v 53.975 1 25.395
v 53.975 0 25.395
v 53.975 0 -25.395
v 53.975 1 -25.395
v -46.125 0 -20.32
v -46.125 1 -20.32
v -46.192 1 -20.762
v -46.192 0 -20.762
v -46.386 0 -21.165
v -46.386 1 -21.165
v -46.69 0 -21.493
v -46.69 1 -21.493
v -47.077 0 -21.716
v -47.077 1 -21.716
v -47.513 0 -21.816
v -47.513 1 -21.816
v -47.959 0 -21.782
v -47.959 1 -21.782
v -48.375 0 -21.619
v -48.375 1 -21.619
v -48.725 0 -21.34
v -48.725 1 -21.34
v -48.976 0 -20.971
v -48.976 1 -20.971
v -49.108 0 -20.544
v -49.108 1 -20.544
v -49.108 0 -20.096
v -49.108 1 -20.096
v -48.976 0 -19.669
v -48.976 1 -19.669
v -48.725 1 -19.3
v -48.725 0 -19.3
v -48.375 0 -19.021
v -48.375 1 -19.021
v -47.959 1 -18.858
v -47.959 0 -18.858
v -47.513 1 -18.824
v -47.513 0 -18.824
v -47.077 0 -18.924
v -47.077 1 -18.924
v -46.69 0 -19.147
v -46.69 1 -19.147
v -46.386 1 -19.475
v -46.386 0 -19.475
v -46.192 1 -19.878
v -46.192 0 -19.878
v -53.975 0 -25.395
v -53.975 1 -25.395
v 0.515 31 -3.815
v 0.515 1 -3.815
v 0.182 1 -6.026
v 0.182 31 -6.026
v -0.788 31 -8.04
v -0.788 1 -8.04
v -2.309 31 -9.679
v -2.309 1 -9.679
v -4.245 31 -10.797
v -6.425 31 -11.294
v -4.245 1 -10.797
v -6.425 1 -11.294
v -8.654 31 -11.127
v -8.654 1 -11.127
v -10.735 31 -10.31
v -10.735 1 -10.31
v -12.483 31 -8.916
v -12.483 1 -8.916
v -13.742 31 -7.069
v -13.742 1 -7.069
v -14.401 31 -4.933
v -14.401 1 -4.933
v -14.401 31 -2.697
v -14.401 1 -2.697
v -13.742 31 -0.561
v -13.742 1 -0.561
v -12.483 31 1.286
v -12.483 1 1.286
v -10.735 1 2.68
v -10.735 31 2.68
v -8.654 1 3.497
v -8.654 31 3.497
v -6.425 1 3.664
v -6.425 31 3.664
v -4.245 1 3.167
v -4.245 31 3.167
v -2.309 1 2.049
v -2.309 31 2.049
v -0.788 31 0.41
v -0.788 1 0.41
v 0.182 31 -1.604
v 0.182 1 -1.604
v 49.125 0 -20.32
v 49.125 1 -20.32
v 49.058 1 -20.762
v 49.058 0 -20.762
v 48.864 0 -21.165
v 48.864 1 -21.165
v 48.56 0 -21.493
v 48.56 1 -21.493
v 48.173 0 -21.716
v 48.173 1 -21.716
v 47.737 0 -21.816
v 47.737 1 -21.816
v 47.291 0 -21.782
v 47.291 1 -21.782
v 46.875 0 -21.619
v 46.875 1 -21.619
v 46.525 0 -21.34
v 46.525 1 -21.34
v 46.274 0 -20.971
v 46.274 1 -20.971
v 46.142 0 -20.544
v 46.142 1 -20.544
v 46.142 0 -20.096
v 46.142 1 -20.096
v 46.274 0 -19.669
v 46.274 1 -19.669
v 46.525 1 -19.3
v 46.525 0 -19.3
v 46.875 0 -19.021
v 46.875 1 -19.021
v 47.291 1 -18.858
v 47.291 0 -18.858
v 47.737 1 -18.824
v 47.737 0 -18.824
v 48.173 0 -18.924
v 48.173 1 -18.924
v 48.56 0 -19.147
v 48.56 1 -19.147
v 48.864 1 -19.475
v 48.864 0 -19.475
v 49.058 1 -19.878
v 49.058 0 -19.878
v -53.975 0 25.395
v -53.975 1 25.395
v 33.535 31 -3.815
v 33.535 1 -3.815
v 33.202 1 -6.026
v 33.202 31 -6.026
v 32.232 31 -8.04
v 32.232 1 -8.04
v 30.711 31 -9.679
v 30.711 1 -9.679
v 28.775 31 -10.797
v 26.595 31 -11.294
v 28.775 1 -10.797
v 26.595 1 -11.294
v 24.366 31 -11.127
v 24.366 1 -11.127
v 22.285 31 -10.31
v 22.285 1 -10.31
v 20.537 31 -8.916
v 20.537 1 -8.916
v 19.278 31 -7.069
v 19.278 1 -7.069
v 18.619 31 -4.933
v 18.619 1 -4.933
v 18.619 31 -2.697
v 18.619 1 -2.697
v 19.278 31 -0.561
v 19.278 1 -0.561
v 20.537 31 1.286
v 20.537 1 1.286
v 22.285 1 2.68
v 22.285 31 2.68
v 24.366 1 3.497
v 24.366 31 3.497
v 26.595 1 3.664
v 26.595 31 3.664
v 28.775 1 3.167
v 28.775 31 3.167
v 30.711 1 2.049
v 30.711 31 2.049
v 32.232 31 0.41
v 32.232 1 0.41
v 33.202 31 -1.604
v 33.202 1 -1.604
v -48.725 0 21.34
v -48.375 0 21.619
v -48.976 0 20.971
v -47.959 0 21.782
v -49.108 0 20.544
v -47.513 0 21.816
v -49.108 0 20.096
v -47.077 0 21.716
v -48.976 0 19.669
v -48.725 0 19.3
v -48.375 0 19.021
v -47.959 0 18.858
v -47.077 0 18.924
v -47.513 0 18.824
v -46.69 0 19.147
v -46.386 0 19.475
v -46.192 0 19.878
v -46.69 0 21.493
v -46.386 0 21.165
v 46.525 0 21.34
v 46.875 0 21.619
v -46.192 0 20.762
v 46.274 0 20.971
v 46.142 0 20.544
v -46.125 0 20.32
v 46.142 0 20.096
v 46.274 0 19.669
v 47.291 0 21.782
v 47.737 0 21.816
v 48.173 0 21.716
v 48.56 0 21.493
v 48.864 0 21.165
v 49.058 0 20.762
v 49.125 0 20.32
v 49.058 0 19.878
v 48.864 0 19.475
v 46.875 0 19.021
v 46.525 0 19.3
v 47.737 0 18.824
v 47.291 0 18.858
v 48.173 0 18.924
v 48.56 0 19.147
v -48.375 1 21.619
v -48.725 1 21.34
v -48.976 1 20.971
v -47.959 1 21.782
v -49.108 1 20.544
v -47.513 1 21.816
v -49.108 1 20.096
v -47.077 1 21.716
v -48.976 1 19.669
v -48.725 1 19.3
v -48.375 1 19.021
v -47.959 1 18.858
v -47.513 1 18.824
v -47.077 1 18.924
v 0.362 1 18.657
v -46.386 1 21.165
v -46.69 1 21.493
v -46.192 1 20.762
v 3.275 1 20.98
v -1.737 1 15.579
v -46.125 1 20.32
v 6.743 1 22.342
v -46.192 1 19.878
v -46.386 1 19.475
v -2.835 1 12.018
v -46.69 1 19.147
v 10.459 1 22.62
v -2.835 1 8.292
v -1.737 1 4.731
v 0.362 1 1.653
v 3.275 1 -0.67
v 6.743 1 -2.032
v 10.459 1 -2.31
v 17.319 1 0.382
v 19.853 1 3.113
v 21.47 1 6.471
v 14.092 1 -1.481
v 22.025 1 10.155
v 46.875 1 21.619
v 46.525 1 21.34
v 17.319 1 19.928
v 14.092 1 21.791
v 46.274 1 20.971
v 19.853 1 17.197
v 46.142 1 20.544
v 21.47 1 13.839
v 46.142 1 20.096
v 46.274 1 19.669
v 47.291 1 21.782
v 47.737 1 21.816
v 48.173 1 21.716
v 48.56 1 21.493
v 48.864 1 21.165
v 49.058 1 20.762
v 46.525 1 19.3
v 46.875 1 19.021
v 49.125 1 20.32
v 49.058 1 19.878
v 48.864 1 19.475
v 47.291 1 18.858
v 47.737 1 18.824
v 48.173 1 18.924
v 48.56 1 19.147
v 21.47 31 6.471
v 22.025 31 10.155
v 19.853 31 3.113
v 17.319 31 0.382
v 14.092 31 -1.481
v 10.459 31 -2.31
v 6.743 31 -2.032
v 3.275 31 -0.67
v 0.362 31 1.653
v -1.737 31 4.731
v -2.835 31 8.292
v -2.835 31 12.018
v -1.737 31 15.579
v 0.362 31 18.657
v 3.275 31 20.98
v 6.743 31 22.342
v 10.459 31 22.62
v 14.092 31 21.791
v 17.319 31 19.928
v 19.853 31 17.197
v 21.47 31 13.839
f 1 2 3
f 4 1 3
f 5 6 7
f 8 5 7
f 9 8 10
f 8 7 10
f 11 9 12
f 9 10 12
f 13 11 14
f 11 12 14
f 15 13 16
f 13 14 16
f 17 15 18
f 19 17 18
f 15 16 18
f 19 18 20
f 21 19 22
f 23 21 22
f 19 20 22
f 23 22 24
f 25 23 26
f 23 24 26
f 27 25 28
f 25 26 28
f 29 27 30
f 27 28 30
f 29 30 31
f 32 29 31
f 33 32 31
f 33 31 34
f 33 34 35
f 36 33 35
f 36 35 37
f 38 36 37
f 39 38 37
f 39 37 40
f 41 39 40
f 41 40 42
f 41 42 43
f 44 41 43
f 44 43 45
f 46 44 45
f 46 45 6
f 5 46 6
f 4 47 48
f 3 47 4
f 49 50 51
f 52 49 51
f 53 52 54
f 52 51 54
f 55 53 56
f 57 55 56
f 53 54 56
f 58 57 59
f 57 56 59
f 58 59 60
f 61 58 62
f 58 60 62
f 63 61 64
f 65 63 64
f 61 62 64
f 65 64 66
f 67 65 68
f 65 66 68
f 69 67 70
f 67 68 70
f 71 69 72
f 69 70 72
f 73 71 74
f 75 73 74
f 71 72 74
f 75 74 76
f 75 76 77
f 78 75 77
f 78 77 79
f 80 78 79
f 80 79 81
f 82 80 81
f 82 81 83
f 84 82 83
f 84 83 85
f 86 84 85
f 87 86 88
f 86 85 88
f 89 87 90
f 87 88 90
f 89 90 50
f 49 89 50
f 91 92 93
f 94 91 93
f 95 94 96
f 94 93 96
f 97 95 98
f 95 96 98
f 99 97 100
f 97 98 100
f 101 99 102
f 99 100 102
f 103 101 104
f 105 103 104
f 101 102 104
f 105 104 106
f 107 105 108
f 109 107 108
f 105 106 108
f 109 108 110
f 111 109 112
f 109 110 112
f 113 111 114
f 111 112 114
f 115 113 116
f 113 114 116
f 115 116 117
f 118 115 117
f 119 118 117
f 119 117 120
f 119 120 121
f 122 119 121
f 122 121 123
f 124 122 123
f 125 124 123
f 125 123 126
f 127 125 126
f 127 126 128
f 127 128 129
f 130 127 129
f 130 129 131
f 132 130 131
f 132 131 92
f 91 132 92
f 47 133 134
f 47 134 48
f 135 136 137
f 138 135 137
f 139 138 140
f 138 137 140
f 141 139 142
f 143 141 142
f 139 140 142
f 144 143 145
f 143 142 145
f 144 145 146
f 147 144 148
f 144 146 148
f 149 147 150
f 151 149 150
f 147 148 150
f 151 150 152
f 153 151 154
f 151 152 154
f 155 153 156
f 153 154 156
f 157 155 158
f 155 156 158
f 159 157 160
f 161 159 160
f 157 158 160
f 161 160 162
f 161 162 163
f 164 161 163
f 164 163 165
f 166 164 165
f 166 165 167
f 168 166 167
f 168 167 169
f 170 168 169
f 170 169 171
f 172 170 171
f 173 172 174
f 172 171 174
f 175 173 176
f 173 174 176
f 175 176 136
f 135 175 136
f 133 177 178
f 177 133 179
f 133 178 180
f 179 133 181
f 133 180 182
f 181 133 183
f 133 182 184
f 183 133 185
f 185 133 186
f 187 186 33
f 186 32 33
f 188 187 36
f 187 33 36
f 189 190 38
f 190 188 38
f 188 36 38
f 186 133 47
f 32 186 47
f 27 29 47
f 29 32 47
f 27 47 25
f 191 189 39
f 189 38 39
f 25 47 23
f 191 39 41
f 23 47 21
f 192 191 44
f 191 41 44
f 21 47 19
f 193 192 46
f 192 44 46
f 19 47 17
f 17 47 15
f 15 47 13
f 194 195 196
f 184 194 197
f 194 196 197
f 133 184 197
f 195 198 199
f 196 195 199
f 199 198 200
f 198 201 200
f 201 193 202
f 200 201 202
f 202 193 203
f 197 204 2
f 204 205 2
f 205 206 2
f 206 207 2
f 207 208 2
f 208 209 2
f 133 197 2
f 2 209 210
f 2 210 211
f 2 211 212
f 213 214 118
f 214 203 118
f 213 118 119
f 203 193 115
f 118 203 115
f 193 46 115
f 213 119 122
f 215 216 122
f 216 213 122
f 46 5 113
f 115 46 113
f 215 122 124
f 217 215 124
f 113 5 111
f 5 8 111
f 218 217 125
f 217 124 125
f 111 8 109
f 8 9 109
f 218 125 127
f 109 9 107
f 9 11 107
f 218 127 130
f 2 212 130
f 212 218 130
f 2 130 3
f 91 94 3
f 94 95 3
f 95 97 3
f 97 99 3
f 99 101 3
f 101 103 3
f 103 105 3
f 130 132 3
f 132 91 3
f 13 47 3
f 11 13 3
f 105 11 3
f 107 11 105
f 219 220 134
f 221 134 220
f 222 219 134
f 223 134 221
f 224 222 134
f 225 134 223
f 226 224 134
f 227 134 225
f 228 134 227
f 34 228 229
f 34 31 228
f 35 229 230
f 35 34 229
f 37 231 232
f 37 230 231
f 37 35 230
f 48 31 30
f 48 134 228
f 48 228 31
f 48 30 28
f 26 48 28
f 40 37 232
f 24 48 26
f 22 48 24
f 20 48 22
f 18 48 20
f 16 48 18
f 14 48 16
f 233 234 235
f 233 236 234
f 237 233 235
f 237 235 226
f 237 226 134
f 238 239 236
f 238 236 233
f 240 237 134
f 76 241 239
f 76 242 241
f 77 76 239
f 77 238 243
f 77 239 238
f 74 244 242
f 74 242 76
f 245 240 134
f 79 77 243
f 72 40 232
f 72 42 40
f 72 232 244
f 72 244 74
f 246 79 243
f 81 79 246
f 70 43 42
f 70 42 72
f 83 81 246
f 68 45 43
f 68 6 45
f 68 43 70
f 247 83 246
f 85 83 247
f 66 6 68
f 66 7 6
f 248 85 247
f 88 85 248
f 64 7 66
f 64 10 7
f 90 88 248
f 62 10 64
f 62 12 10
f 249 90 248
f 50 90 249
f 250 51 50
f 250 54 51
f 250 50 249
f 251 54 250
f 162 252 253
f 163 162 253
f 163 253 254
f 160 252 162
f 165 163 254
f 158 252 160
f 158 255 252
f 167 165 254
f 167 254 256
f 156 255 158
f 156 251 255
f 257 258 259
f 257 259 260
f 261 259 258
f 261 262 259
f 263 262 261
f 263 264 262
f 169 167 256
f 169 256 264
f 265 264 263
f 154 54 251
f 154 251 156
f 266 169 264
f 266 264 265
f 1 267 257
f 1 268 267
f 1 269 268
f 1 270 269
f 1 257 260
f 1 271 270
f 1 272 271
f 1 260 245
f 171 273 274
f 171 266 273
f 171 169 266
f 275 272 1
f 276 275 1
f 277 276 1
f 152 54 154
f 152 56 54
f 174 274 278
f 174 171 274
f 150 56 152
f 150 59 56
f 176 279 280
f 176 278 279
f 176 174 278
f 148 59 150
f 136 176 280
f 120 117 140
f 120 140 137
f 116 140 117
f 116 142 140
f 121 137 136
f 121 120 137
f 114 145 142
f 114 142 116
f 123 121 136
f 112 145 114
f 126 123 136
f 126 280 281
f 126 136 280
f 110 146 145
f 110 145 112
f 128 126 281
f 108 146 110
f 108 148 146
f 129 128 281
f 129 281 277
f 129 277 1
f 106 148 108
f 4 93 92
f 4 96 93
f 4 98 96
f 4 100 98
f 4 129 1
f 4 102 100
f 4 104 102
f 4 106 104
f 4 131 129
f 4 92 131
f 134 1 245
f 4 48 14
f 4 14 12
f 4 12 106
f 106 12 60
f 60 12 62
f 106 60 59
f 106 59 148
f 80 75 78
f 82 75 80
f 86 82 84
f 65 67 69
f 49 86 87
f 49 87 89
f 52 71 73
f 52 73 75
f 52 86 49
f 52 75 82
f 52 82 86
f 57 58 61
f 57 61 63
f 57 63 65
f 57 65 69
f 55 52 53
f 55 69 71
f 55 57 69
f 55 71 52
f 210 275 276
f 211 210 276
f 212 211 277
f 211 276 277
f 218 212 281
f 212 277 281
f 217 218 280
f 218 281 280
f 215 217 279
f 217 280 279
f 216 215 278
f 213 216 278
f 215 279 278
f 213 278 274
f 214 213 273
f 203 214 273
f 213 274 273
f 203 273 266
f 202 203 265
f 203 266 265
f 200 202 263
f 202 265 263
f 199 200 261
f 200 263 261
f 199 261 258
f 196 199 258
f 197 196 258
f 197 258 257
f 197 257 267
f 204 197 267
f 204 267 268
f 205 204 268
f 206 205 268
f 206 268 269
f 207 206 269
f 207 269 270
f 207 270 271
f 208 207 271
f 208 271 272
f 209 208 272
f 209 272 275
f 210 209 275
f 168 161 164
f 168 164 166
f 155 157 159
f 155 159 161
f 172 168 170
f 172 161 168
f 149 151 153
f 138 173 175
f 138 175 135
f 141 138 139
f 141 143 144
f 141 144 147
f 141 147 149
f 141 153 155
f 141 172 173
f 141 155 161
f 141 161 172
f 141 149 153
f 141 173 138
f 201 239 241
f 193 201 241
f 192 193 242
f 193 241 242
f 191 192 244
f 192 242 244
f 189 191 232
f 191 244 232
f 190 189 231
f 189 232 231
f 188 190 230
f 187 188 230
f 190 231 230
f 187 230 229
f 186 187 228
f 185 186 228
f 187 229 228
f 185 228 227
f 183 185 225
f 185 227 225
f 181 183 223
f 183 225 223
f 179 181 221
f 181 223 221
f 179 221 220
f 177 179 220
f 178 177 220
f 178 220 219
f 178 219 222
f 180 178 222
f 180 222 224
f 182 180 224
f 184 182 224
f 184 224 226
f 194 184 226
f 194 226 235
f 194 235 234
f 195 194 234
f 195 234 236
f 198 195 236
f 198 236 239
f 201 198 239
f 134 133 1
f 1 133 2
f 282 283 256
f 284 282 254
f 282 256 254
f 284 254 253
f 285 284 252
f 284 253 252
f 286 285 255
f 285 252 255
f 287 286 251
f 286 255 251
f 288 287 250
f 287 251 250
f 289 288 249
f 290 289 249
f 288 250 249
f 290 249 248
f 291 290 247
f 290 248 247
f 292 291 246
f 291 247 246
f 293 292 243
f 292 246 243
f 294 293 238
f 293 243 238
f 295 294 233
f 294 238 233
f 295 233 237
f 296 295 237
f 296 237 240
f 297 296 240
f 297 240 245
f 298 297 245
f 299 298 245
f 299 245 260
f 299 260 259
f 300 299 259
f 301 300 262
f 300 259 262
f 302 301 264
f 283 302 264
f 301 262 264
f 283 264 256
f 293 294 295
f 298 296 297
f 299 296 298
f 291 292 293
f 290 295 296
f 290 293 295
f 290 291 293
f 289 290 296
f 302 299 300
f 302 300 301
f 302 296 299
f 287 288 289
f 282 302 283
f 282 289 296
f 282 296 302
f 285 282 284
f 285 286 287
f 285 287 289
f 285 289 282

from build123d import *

# Parameters (mm, degrees)
SCHIZZO1_W                   = 107.95
SCHIZZO1_H                   = 50.79
ESTRUSIONE_ESTRUSIONE1_DEPTH = 1
SCHIZZO2_R                   = 1.5
TAGLIO_ESTRUSIONE1_DEPTH     = 2
SCHIZZO3_R                   = 7.5
SCHIZZO3_R_2                 = 12.5
ESTRUSIONE_ESTRUSIONE2_DEPTH = 30


with BuildPart() as part:
    # Schizzo1 → Estrusione-Estrusione1 (new body)
    with BuildSketch(Plane(origin=(0, 0, 0), x_dir=(1, 0, 0), z_dir=(0, 1, 0))):
        Rectangle(SCHIZZO1_W, SCHIZZO1_H)
    extrude(amount=ESTRUSIONE_ESTRUSIONE1_DEPTH)

    # Schizzo2 → Taglio-Estrusione1 (cut, through all)
    with BuildSketch(Plane(origin=(0, 1, 0), x_dir=(1, 0, 0), z_dir=(0, 1, 0))):
        with Locations((-47.625, 20.32)):
            Circle(SCHIZZO2_R)
        with Locations((47.625, 20.32)):
            Circle(SCHIZZO2_R)
        with Locations((47.625, -20.32)):
            Circle(SCHIZZO2_R)
        with Locations((-47.625, -20.32)):
            Circle(SCHIZZO2_R)
    extrude(amount=-TAGLIO_ESTRUSIONE1_DEPTH, mode=Mode.SUBTRACT)

    # Schizzo3 → Estrusione-Estrusione2 (add)
    with BuildSketch(Plane(origin=(0, 1, 0), x_dir=(1, 0, 0), z_dir=(0, 1, 0))):
        with Locations((26.035, 3.815)):
            Circle(SCHIZZO3_R)
        with Locations((-6.985, 3.815)):
            Circle(SCHIZZO3_R)
        with Locations((9.525, -10.155)):
            Circle(SCHIZZO3_R_2)
    extrude(amount=ESTRUSIONE_ESTRUSIONE2_DEPTH)


solid = part.part
